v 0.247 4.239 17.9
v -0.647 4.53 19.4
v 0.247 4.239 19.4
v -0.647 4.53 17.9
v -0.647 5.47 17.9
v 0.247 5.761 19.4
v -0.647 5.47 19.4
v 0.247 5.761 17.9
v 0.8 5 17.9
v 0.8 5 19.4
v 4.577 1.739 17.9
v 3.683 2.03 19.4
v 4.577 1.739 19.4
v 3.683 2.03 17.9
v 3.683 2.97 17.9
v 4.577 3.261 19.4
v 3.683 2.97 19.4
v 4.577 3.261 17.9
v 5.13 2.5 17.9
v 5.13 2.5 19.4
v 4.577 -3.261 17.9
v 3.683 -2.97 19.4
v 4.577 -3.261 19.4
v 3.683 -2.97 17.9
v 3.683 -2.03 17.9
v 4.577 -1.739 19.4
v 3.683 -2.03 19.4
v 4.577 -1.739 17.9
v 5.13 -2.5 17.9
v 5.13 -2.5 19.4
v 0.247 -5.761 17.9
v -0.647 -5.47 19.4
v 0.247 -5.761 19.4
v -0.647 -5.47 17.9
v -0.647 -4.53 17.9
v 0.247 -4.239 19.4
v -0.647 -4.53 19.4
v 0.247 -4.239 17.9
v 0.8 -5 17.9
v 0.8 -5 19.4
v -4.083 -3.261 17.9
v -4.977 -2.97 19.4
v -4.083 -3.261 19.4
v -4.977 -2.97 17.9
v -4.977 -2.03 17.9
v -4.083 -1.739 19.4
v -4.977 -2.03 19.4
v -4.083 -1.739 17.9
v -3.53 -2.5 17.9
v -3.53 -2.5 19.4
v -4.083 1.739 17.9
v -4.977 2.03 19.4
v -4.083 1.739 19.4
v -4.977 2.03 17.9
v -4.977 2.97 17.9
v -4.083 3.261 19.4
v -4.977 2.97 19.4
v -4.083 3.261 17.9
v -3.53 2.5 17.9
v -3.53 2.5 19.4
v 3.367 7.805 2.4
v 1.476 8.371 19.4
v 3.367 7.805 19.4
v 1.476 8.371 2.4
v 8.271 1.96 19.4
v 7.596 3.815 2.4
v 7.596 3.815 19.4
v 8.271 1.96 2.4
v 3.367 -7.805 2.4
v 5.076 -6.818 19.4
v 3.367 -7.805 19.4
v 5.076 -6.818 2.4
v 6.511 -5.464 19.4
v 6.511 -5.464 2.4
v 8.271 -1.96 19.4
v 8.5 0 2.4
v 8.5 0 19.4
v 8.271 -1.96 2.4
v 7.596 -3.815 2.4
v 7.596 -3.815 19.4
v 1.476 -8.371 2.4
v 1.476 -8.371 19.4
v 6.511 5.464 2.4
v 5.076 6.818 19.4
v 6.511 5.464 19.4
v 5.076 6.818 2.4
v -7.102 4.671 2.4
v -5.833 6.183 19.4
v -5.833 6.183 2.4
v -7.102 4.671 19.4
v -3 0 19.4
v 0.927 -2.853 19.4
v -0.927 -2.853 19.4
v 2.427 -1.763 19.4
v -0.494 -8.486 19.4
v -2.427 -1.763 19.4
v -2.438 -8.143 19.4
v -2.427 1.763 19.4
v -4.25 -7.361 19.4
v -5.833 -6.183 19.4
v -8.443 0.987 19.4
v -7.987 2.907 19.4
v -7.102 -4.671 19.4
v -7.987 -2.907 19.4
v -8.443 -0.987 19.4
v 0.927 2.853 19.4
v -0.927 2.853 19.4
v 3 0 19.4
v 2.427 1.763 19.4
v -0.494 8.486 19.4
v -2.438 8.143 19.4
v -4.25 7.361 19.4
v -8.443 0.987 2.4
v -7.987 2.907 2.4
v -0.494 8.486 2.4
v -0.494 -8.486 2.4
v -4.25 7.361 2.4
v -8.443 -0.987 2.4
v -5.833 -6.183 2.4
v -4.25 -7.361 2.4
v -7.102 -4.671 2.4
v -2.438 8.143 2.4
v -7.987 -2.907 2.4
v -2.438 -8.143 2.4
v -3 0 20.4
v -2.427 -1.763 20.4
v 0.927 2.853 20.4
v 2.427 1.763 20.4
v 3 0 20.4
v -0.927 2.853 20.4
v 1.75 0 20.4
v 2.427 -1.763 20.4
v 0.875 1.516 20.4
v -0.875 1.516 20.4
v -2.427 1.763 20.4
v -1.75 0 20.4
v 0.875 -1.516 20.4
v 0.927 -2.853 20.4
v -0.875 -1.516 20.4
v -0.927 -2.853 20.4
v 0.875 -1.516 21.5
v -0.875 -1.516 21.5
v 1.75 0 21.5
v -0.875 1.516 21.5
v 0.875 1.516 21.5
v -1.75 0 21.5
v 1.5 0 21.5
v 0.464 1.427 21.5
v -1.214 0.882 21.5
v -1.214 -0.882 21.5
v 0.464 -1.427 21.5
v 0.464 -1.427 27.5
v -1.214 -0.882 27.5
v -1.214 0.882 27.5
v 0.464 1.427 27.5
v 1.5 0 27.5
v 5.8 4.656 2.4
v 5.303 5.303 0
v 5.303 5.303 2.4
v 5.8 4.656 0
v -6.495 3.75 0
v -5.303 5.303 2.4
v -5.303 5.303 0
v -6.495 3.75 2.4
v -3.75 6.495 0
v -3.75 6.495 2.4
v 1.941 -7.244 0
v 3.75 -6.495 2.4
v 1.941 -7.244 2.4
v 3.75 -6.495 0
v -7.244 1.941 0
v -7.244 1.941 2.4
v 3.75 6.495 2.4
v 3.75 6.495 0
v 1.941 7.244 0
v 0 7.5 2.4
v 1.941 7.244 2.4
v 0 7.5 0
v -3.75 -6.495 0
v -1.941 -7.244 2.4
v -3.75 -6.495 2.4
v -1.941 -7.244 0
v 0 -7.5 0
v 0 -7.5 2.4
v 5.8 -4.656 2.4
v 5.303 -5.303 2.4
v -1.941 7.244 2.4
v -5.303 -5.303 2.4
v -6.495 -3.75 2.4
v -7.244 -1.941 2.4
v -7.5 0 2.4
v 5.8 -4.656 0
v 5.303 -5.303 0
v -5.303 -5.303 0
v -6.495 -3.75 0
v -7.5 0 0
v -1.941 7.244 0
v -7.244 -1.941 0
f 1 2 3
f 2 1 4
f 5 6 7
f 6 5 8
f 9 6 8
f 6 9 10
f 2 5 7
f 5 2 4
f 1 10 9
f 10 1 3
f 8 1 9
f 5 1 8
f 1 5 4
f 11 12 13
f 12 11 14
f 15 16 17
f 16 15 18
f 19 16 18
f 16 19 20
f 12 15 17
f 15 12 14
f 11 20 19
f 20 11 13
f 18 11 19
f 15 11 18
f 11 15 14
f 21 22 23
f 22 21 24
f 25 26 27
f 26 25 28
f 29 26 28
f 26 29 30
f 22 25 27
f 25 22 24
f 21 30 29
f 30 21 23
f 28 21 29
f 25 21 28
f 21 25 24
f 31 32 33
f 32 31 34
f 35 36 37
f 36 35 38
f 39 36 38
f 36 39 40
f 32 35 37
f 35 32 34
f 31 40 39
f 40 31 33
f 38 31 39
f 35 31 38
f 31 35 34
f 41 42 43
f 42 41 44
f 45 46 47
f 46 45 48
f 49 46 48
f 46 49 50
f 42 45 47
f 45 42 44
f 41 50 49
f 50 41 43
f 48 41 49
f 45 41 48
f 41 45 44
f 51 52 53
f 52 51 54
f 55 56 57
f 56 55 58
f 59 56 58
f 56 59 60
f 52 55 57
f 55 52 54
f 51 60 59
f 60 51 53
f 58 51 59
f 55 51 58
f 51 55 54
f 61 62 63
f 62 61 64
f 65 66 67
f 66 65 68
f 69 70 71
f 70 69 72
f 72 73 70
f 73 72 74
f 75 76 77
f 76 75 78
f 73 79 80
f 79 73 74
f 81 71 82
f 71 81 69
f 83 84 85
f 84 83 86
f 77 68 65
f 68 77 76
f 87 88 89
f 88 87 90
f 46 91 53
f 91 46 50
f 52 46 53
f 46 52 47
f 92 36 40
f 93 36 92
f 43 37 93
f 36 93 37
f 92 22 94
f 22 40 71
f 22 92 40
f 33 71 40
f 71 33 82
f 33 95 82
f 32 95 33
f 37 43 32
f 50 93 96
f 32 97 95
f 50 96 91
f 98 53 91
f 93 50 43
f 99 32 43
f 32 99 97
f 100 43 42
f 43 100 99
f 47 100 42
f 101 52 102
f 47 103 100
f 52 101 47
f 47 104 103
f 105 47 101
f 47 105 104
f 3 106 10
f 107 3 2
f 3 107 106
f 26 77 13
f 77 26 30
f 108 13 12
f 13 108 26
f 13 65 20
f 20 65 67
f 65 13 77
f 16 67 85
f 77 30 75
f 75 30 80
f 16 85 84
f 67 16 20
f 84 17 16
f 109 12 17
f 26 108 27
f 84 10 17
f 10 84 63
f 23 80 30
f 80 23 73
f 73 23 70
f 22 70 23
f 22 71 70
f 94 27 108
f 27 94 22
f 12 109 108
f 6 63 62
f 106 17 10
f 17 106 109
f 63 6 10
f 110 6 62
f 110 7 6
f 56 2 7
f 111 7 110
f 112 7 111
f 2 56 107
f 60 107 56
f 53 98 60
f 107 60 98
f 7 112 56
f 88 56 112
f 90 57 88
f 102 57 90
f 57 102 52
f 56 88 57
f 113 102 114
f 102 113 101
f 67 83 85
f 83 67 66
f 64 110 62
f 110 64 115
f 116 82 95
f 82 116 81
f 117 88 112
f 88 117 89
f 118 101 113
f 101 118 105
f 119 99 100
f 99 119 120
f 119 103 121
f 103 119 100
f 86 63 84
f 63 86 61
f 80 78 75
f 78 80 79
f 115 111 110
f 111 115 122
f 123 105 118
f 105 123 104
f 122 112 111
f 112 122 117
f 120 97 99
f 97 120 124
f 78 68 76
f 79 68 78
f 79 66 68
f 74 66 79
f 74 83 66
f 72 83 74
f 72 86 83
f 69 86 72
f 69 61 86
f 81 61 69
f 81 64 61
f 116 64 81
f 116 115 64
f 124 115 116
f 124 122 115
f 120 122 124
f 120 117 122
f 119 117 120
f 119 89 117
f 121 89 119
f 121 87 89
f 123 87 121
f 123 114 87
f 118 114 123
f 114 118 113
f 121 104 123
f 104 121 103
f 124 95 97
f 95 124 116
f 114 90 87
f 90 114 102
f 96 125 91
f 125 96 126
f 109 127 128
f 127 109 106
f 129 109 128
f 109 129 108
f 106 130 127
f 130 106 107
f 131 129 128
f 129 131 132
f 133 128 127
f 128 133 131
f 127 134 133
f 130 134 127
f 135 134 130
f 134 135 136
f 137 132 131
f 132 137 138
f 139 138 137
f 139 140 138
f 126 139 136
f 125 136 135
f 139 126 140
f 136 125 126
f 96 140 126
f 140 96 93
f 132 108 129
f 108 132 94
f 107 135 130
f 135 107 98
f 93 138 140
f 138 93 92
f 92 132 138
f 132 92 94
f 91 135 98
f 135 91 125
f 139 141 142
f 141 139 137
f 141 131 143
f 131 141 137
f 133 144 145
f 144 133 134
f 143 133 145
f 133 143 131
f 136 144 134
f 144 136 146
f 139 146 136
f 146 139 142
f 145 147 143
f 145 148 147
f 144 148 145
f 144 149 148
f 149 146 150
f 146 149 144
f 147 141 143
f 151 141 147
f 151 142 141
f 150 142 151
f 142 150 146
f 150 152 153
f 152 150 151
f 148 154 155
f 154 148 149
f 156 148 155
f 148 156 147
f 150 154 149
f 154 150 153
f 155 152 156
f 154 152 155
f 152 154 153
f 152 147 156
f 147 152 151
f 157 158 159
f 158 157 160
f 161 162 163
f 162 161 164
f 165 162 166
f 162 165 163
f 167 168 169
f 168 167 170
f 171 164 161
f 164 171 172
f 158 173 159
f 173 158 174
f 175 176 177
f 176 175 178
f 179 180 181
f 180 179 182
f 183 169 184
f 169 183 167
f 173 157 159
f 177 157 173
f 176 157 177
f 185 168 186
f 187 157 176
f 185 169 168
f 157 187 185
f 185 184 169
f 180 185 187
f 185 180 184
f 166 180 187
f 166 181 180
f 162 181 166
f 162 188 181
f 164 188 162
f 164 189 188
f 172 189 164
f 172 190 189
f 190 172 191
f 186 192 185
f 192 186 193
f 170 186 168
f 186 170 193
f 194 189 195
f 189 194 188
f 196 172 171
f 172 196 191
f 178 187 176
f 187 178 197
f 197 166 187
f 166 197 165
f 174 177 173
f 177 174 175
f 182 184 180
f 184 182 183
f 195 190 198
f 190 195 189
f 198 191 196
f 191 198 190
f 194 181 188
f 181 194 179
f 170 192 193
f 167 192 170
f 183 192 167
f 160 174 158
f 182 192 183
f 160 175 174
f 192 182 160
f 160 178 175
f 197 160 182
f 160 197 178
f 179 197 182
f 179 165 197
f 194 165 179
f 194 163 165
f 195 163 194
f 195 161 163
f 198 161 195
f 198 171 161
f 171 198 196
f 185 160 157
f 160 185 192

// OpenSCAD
//motor 1717 modeling
//https://www.shinkoh-faulhaber.jp/JP_data_edition_2020/JP_IEH2-4096_DFF.pdf
//https://www.shinkoh-faulhaber.jp/products/series/1717sr

fl = 17;//17; //faulharber1717 17height 
el=2.4; //encoder height with encoder 19.4(mm)
er=(15/2);
fr = (17/2);
sl = 1.6; //screw length 1.6(mm)
sr = 0.8; //screw hole 0.3(mm)

a1r=3; //axis sholder base 1 6mm diameter
a2r=1.75; //axis sholder base 2 3.5mm diameter
a1h=1; //height is measured from body
a2h=2.1; //height is from body
ar=1.5;//axis diameter 1.5mm
ah=8.1;//height is measured from body


module screwhole(hscrew, rscrew, rcircle, bheight){
    for(angle=[0:60:360]){
translate([rcircle*sin(angle),rcircle*cos(angle),bheight])
cylinder(h=hscrew, r=rscrew);
    }
}

module motor1717(){
difference(){
    cylinder(h=fl, r=fr);
    screwhole(sl, sr, 5, fl-sl+0.1);
}

translate([0,0, fl])
    cylinder(h=a1h, r=a1r);
translate([0,0,fl])
    cylinder(h=a2h, r=a2r);
translate([0,0,fl])
    cylinder(h=ah, r=ar);
}

module encoder1717(){
    difference(){
        cylinder(h=el, r=er);
        translate([5.8, -10,-3])
        cube([17,20,el+5]);
    }
}

translate([0,0,el])
color("silver") motor1717();
color("black")encoder1717();

//color("red") screwhole(sl, sr, 5, fl-sl+0.1);
